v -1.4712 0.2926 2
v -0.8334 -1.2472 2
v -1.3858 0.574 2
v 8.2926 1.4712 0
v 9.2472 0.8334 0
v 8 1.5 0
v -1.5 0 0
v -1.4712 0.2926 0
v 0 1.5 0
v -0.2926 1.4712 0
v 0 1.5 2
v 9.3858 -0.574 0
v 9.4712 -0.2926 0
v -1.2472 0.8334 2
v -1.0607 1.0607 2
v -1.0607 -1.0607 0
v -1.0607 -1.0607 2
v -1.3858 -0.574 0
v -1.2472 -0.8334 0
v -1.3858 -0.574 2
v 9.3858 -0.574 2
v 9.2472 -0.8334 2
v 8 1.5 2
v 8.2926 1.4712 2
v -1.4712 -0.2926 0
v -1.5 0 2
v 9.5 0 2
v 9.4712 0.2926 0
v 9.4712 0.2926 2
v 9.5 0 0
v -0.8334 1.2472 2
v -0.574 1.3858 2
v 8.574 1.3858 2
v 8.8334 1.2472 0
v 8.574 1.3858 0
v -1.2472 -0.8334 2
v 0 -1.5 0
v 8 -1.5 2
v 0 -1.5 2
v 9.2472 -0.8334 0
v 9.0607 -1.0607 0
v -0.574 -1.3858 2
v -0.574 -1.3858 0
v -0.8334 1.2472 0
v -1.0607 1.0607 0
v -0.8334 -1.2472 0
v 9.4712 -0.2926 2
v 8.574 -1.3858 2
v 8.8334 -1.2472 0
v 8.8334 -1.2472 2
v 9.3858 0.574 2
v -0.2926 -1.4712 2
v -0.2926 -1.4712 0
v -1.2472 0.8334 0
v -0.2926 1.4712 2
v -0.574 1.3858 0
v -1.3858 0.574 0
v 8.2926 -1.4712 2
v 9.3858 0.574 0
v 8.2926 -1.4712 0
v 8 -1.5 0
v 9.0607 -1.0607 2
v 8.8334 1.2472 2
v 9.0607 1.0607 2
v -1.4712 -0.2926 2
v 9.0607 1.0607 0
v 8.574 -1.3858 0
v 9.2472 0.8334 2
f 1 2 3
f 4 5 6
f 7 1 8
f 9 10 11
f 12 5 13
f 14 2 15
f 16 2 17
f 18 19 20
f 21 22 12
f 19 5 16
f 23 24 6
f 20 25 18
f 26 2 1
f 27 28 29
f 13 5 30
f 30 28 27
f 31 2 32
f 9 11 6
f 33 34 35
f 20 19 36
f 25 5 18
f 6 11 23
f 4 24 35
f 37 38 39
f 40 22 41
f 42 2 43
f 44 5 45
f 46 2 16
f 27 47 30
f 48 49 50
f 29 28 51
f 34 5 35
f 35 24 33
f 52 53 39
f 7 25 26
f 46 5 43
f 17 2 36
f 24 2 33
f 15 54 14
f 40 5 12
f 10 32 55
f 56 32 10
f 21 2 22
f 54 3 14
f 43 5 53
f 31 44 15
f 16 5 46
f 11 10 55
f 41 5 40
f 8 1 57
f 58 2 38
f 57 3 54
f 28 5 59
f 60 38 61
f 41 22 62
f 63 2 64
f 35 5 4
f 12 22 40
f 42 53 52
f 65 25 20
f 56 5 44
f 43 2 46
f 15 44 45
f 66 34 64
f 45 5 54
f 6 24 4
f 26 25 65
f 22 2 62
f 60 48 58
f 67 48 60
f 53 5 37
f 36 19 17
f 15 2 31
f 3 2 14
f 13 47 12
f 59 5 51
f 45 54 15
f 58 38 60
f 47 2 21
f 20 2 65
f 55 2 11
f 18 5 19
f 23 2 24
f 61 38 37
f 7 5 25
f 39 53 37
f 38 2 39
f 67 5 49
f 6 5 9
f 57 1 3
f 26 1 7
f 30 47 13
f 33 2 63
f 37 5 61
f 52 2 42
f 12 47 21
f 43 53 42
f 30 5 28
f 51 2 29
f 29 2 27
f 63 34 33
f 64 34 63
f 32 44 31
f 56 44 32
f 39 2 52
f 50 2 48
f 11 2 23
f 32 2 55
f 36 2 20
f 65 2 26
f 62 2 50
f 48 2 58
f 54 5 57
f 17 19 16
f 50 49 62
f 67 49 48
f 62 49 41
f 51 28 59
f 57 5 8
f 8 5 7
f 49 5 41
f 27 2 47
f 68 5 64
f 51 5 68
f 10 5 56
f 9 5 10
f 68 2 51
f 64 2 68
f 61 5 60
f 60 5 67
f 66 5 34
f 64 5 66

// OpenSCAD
module slot(len, dia, h) {
  $fn = 32;
  hull() {
    cylinder(h = h, r = dia / 2);
    translate([len, 0, 0]) cylinder(h = h, r = dia / 2);
  }
}

slot(8, 3, 2);
